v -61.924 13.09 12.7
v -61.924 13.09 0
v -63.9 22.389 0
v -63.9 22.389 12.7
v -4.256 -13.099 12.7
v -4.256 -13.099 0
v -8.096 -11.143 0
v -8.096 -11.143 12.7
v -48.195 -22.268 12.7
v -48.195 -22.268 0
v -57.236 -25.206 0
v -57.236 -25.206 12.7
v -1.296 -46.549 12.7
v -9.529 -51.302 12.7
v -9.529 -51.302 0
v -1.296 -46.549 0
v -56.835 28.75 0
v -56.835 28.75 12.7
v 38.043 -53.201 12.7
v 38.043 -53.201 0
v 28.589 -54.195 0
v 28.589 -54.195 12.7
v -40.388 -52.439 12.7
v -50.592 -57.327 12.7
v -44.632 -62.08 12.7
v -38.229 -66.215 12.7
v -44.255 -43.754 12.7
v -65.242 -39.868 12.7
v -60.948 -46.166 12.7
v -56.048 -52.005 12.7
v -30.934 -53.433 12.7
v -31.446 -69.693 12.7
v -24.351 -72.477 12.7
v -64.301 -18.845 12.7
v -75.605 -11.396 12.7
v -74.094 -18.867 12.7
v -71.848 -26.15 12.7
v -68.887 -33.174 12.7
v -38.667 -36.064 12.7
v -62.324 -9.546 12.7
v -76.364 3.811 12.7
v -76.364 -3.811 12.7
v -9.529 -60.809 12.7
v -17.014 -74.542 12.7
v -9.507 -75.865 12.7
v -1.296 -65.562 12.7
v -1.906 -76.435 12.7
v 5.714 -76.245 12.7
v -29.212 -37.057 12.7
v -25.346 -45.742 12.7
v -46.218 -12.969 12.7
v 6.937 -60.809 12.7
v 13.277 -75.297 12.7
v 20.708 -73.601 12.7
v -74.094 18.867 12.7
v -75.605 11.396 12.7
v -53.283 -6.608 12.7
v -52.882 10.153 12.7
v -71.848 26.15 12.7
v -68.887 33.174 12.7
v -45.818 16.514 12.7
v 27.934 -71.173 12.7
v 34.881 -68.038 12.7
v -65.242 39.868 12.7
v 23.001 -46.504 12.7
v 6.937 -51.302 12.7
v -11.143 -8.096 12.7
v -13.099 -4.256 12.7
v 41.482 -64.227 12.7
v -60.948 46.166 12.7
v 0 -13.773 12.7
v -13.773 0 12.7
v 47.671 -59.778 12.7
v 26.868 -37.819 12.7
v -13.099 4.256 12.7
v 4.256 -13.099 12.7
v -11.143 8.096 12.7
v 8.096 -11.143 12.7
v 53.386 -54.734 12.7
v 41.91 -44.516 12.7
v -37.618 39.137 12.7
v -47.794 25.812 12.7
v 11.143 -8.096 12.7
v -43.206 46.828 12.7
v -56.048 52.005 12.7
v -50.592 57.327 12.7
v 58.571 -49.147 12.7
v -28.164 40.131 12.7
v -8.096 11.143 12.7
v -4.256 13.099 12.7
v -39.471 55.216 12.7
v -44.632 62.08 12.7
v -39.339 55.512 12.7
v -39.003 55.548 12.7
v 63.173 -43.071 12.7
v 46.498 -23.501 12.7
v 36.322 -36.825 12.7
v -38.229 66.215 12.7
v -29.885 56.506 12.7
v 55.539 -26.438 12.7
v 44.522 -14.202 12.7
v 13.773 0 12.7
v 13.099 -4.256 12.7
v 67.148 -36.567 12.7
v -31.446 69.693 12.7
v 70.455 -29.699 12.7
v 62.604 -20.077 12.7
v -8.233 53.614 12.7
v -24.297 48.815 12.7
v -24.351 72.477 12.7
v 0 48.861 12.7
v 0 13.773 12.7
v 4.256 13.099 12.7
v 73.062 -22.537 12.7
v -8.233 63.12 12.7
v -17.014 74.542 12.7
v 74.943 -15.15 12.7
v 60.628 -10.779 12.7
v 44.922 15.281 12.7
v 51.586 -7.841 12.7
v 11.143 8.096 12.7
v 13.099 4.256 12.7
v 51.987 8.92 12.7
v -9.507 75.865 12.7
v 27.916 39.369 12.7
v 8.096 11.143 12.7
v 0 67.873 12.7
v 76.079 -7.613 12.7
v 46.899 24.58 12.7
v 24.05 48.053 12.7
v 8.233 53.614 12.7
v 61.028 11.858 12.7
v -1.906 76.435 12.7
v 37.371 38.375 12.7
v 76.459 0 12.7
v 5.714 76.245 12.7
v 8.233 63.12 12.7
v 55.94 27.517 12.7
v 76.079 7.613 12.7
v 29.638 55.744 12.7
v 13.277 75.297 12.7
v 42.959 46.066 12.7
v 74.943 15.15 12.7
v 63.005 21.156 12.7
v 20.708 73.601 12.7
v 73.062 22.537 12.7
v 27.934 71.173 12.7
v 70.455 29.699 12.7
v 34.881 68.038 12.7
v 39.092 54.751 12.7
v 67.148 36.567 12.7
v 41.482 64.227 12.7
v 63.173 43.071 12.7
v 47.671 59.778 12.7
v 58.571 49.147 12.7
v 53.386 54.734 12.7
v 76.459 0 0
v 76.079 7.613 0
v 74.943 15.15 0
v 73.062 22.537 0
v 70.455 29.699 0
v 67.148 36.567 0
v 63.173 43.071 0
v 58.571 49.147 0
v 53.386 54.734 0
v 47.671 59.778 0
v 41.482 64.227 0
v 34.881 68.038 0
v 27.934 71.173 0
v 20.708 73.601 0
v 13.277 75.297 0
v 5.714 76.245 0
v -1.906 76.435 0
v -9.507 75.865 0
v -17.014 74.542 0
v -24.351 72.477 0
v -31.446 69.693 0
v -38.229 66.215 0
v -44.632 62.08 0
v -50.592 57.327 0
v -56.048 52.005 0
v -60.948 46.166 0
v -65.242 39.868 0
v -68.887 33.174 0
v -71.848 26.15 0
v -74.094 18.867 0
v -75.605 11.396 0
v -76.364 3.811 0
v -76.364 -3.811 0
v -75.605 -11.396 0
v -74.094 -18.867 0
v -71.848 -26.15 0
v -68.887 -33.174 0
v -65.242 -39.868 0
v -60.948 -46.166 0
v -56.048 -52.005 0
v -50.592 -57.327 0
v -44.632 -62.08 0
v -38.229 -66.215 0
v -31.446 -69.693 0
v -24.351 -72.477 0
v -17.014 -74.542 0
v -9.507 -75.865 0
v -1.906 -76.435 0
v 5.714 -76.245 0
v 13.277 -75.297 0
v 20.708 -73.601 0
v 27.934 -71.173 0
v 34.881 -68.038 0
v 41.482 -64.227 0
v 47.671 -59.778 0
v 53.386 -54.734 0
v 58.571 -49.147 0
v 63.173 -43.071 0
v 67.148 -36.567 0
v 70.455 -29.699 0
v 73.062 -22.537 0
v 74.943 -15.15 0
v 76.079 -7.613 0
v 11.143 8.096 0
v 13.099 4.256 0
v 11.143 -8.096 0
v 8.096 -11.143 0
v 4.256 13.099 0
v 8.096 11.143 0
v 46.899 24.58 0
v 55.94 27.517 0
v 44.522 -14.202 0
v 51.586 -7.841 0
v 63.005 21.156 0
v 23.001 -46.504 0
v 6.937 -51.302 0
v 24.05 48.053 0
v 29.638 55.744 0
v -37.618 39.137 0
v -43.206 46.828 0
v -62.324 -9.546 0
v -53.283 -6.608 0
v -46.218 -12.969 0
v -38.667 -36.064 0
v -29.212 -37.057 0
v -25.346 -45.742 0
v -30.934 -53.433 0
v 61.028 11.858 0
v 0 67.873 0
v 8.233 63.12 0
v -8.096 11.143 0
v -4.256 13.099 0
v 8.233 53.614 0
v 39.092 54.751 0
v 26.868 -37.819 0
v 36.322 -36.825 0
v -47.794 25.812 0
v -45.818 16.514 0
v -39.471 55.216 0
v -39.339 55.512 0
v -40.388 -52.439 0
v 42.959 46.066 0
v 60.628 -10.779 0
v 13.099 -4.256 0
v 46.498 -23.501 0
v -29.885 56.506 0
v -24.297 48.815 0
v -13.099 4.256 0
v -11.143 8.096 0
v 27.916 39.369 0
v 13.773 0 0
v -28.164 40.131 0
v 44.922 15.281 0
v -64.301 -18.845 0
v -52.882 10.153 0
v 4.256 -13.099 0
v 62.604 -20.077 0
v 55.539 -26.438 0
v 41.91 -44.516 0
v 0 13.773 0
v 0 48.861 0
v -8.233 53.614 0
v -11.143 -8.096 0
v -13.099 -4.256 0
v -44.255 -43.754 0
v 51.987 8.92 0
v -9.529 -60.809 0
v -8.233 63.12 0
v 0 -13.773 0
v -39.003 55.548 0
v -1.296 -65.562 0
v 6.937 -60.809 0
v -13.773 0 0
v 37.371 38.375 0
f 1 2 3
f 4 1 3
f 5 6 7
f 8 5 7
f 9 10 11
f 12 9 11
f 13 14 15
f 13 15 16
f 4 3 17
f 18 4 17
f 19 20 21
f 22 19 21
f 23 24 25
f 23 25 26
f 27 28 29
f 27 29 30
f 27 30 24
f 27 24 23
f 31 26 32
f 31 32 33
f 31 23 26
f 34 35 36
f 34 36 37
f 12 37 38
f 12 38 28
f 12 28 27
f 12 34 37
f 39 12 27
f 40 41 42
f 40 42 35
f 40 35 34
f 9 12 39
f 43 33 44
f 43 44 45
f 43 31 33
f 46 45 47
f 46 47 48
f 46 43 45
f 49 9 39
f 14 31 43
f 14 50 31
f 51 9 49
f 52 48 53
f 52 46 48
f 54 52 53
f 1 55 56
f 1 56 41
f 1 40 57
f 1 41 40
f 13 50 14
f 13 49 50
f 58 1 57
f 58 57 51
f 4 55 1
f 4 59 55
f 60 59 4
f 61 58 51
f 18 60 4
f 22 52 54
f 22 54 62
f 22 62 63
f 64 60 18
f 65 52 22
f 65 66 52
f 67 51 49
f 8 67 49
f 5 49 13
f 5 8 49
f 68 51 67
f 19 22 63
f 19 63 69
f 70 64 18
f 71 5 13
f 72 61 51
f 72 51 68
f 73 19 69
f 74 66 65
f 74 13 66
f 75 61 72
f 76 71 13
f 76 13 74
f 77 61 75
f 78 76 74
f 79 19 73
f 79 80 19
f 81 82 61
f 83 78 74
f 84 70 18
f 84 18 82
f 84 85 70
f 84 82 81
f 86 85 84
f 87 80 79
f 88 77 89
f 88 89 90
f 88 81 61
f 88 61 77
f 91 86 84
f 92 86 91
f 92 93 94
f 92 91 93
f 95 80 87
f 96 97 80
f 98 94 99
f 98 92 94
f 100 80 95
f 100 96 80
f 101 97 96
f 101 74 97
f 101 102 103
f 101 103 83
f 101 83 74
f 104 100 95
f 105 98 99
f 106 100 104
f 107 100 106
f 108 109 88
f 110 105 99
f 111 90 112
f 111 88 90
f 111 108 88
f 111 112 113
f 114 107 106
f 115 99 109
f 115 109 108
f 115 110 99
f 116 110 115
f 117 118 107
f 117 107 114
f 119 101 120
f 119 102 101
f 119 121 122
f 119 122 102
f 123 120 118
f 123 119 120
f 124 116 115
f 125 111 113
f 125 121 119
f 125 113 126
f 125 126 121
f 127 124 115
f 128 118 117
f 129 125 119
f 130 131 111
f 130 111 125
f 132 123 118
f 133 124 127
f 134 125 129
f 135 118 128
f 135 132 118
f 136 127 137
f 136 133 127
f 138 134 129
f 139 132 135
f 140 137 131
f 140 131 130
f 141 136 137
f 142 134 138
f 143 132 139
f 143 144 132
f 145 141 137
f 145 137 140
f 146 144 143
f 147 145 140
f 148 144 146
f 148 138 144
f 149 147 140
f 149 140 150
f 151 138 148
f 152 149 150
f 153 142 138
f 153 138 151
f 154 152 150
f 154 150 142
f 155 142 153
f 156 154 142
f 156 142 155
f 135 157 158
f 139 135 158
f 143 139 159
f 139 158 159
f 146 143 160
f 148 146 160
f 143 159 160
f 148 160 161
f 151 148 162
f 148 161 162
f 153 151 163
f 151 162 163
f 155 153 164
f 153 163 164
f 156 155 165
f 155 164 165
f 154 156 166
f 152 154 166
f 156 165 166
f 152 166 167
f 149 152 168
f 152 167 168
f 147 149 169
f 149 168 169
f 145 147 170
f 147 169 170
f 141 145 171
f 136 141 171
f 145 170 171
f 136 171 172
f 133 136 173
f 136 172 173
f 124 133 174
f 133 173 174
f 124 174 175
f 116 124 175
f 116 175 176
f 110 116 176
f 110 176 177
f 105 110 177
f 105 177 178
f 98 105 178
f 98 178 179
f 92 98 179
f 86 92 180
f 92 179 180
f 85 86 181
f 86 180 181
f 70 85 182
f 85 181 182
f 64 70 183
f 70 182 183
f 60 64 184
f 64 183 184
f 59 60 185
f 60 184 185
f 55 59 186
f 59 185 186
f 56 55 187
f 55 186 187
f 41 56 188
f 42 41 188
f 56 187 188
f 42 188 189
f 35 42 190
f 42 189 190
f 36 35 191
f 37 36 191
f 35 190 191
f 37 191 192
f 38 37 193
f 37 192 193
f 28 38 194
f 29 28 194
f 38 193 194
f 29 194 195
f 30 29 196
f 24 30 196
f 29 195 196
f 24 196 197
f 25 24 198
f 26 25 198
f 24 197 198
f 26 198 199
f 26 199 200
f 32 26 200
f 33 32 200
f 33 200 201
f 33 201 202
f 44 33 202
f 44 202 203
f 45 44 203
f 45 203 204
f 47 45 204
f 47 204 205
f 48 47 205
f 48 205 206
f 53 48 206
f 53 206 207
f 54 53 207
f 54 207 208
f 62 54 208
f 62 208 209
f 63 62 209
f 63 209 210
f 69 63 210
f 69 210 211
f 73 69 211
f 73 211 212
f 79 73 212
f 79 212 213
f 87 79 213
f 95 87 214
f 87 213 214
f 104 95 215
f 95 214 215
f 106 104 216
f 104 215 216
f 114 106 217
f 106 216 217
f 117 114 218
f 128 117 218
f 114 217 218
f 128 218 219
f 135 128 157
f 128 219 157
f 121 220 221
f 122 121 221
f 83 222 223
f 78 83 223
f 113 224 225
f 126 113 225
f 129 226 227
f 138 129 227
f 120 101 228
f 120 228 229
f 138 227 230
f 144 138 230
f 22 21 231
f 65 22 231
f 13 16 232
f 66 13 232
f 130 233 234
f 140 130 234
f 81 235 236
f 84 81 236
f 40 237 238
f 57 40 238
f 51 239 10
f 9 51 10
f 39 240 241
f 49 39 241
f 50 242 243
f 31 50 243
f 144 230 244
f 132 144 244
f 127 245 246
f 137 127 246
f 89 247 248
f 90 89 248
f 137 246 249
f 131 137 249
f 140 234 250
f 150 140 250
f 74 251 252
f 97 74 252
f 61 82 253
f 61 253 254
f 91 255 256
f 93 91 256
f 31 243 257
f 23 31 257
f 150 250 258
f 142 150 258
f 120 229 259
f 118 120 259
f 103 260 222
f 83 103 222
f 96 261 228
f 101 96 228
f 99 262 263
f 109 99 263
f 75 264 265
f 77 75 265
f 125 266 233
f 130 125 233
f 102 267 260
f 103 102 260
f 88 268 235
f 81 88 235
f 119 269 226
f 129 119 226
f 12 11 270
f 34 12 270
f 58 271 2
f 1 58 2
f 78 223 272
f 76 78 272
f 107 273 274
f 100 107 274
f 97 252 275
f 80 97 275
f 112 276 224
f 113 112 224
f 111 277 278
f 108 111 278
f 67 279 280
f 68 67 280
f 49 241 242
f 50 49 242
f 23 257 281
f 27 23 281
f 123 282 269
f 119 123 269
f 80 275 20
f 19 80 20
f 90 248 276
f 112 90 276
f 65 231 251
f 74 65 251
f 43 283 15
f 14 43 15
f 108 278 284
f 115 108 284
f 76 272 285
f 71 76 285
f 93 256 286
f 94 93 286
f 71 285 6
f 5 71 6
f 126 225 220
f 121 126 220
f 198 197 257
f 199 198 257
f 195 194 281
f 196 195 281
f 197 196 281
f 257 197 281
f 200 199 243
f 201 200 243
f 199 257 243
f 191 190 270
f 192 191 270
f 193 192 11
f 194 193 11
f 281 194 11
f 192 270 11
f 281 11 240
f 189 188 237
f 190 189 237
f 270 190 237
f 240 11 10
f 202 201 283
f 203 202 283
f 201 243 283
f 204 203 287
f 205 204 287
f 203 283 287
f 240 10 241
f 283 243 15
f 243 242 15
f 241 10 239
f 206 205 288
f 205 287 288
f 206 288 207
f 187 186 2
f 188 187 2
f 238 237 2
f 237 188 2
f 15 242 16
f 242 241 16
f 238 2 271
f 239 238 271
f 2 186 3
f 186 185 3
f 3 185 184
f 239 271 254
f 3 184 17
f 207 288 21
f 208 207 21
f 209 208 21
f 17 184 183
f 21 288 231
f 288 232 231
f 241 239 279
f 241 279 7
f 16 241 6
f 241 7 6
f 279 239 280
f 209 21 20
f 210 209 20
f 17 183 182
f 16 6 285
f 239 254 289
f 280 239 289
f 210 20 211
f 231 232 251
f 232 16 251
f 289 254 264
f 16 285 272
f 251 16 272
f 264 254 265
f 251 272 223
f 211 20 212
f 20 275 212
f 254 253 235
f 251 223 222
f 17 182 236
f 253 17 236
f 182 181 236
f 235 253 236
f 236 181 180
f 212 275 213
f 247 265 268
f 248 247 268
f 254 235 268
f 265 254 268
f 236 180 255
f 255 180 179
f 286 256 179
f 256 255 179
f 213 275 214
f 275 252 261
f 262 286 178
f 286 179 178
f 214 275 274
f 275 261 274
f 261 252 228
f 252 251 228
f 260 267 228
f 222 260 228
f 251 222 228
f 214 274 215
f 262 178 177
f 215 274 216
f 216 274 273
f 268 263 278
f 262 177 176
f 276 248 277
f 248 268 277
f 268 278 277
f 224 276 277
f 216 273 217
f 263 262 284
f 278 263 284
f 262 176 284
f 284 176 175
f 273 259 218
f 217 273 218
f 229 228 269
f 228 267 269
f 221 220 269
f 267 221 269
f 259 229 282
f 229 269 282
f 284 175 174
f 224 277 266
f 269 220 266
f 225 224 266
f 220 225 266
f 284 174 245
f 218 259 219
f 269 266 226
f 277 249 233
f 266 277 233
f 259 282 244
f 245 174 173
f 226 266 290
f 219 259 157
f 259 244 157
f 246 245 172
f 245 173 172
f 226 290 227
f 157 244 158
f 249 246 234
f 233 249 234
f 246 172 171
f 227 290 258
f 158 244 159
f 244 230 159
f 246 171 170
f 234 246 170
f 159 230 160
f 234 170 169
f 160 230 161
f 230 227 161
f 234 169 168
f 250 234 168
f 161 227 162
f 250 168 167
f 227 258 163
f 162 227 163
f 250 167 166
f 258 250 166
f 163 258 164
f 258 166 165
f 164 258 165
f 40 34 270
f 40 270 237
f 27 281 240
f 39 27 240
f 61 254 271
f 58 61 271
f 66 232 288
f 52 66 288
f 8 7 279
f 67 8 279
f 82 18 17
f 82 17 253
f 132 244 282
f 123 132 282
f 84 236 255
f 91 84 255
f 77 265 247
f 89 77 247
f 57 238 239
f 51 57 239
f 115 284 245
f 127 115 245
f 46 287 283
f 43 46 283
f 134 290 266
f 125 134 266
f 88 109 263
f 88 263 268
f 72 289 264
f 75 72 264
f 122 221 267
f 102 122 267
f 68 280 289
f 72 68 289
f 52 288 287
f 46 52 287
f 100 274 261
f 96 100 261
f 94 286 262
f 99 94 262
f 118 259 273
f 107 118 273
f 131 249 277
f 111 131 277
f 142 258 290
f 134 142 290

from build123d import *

# Parameters (mm, degrees)
F0_R     = 76.4587467439
F1_DEPTH = 12.7


with BuildPart() as f1:
    # F0 (on Top) → F1 (new body)
    with BuildSketch(Plane.XY):
        Circle(F0_R)
        with BuildLine():
            ThreePointArc((0, 67.8734653551), (47.9937876152, 47.9937876152), (67.8734653551, 0))
            ThreePointArc((67.8734653551, 0), (-31.0463451655, -60.3567042769), (-39.4713337388, 55.2161309057))
            Line((-39.4713337388, 55.2161309057), (-39.3394193415, 55.5124154929))
            Line((-39.3394193415, 55.5124154929), (-39.0032717993, 55.5477460232))
            ThreePointArc((-39.0032717993, 55.5477460232), (-20.4522527371, 64.7187195276), (0, 67.8734653551))
        make_face(mode=Mode.SUBTRACT)
        with BuildLine():
            ThreePointArc((-39.4713337388, 55.2161309057), (-31.0463451655, -60.3567042769), (67.8734653551, 0))
            ThreePointArc((67.8734653551, 0), (47.9937876152, 47.9937876152), (0, 67.8734653551))
            ThreePointArc((0, 67.8734653551), (-20.4522527371, 64.7187195276), (-39.0032717993, 55.5477460232))
            Line((-39.0032717993, 55.5477460232), (-29.885018528, 56.5061130603))
            Line((-29.885018528, 56.5061130603), (-24.2972507842, 48.8152105619))
            Line((-24.2972507842, 48.8152105619), (-28.1638838539, 40.1306104961))
            Line((-28.1638838539, 40.1306104961), (-37.6182846674, 39.1369129287))
            Line((-37.6182846674, 39.1369129287), (-43.2060524113, 46.8278154271))
            Line((-43.2060524113, 46.8278154271), (-39.4713337388, 55.2161309057))
        make_face()
        Polygon((-30.9335204728, -53.4327342282), (-40.3879212864, -52.4390366608), (-44.2545543561, -43.754436595), (-38.6667866123, -36.0635340966), (-29.2123857987, -37.057231664), (-25.345752729, -45.7418317298), align=None, mode=Mode.SUBTRACT)
        Polygon((6.9368320268, -60.8086286285), (-1.2960196783, -65.5618677767), (-9.5288713835, -60.8086286285), (-9.5288713835, -51.3021503321), (-1.2960196783, -46.548911184), (6.9368320268, -51.3021503321), align=None, mode=Mode.SUBTRACT)
        Polygon((-57.235837277, -25.2058756113), (-64.3005274315, -18.8448000245), (-62.3240194552, -9.5460610875), (-53.2828213244, -6.6083977373), (-46.21813117, -12.969473324), (-48.1946391463, -22.268212261), align=None, mode=Mode.SUBTRACT)
        Polygon((41.9100327329, -44.5162178486), (38.0433996632, -53.2008179144), (28.5889988496, -54.1945154818), (23.0012311058, -46.5036129834), (26.8678641755, -37.8190129176), (36.3222649891, -36.8253153502), align=None, mode=Mode.SUBTRACT)
        Polygon((60.6275076712, -10.7786490478), (62.6040156475, -20.0773879848), (55.539325493, -26.4384635716), (46.4981273623, -23.5008002214), (44.521619386, -14.2020612844), (51.5863095404, -7.8409856976), align=None, mode=Mode.SUBTRACT)
        Polygon((-61.9235273495, 13.0902466263), (-63.9000353258, 22.3889855633), (-56.8353451714, 28.7500611501), (-47.7941470406, 25.8123977998), (-45.8176390643, 16.5136588628), (-52.8823292188, 10.1525832761), align=None, mode=Mode.SUBTRACT)
        Polygon((4.2561218167, 13.0989960474), (8.0956247758, 11.1426715763), (11.1426715763, 8.0956247758), (13.0989960474, 4.2561218167), (13.7730995193, 0), (13.0989960474, -4.2561218167), (11.1426715763, -8.0956247758), (8.0956247758, -11.1426715763), (4.2561218167, -13.0989960474), (0, -13.7730995193), (-4.2561218167, -13.0989960474), (-8.0956247758, -11.1426715763), (-11.1426715763, -8.0956247758), (-13.0989960474, -4.2561218167), (-13.7730995193, 0), (-13.0989960474, 4.2561218167), (-11.1426715763, 8.0956247758), (-8.0956247758, 11.1426715763), (-4.2561218167, 13.0989960474), (0, 13.7730995193), align=None, mode=Mode.SUBTRACT)
        Polygon((55.9398175987, 27.5174731897), (63.0045077531, 21.156397603), (61.0279997768, 11.857658666), (51.9868016461, 8.9199953157), (44.9221114916, 15.2810709025), (46.8986194679, 24.5798098395), align=None, mode=Mode.SUBTRACT)
        Polygon((29.6375007945, 55.7443318067), (39.091901608, 54.7506342393), (42.9585346778, 46.0660341735), (37.3707669339, 38.3751316751), (27.9163661204, 39.3688292425), (24.0497330506, 48.0534293083), align=None, mode=Mode.SUBTRACT)
        Polygon((-8.2328517052, 63.1202262069), (0, 67.8734653551), (8.2328517052, 63.1202262069), (8.2328517052, 53.6137479106), (0, 48.8605087624), (-8.2328517052, 53.6137479106), align=None, mode=Mode.SUBTRACT)
    extrude(amount=F1_DEPTH)


solid = f1.part
